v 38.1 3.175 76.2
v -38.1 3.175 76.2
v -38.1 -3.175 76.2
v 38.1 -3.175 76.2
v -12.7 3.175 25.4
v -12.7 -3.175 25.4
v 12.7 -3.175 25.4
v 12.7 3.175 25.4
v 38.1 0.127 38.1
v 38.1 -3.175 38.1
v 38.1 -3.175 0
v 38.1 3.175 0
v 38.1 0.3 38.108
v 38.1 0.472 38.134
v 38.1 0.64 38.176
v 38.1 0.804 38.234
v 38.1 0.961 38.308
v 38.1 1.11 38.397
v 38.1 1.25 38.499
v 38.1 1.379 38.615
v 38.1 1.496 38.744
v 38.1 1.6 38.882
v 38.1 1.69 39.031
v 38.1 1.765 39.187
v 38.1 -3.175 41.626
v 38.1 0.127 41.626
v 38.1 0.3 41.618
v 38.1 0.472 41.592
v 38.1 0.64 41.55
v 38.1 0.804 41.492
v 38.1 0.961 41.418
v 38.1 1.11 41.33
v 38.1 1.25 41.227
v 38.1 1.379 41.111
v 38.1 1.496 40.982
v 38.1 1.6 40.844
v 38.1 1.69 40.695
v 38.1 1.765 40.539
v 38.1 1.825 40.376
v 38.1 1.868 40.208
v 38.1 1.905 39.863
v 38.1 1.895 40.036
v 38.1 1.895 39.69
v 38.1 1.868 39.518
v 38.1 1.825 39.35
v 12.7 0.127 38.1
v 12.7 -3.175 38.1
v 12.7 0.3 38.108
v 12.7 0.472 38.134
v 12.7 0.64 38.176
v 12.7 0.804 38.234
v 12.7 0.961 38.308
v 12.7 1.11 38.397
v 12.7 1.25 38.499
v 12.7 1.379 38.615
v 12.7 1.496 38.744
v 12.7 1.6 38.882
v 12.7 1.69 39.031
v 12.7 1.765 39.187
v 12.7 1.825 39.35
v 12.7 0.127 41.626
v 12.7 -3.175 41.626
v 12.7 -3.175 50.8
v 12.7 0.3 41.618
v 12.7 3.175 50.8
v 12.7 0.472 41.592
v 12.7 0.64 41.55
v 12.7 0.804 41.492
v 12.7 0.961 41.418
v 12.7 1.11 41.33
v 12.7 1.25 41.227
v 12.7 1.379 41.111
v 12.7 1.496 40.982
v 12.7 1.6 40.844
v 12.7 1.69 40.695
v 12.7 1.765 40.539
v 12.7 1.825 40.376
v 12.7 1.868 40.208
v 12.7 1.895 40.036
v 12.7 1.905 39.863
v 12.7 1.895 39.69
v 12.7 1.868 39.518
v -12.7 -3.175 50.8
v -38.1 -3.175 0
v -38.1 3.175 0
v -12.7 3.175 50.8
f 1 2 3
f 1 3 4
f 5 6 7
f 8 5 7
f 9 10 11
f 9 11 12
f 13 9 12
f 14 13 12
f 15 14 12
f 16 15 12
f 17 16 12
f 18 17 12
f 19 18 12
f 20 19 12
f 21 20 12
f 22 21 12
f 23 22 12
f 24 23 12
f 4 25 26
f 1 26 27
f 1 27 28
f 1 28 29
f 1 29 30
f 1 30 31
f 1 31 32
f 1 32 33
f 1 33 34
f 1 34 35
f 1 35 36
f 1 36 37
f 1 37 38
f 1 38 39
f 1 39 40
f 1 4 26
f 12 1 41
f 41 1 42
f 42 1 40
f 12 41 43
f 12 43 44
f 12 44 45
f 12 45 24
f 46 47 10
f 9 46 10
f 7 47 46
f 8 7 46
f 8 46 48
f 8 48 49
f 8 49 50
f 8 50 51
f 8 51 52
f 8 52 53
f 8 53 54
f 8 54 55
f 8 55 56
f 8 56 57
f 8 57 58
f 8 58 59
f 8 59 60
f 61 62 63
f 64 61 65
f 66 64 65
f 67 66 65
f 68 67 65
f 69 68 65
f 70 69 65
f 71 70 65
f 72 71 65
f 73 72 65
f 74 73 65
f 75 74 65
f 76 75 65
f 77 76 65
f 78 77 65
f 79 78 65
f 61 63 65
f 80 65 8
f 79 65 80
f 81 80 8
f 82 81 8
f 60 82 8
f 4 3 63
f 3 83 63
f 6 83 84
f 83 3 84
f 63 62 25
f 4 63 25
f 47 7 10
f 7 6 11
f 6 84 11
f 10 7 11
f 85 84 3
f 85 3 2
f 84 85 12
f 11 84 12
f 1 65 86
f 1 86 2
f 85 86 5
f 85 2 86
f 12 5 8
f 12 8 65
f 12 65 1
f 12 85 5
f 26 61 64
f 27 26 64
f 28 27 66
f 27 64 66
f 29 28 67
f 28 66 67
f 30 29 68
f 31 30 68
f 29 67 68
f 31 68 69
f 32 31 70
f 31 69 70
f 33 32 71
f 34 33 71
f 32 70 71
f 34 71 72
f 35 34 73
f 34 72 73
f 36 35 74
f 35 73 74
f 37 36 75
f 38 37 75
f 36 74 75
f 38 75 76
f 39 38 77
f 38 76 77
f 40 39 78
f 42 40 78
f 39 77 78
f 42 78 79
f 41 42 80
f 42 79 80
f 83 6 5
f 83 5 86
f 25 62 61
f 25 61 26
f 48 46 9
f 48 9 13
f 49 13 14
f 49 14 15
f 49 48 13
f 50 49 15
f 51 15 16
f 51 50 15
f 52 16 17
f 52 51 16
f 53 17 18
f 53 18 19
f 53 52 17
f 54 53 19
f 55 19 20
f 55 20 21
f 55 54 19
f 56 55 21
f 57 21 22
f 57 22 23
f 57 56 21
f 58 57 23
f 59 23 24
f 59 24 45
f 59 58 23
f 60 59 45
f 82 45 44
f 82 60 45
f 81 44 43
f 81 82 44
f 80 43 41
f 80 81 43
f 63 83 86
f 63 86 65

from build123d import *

# Parameters (mm, degrees)
F0_W        = 76.2
F0_H        = 6.35
F1_DEPTH    = 76.2
F2_W        = 25.4
F2_H        = 25.4
F3_DEPTH    = 25.4
F4_W        = 25.4
F4_H        = 3.5260361671
F5_DEPTH    = 5.08
F8_T1_DEPTH = 25.4


# Not quite as in the source:
# - a fillet or chamfer that OpenCascade refuses, or shapes differently, is made with other operations: its cross-section is extruded or revolved along the edge and cut away or added
# - the program builds the solid bodies; features that only make, move or delete a surface that nothing else refers to are left out


with BuildPart() as f1:
    # F0 (on Top) → F1 (new body)
    with BuildSketch(Plane.XY):
        Rectangle(F0_W, F0_H)
    extrude(amount=F1_DEPTH)

    # F2 (on face) → F3 (cut)
    with BuildSketch(Plane.XZ.offset(3.175)):
        with Locations((0, 38.1)):
            Rectangle(F2_W, F2_H)
    extrude(amount=-F3_DEPTH, mode=Mode.SUBTRACT)

    # F4 (on face) → F5 (cut)
    with BuildSketch(Plane.XZ.offset(3.175)):
        with Locations((25.4, 39.8630180836)):
            Rectangle(F4_W, F4_H)
    extrude(amount=-F5_DEPTH, mode=Mode.SUBTRACT)

    # F8: fillet of radius 1.778 on 2 edges, made by hand

    # F8_s2 → F8_t1 (join)
    with BuildSketch(Plane.YZ.offset(12.7)):
        with BuildLine():
            ThreePointArc((0.127, 41.6260361671), (1.3842358569, 41.1052720241), (1.905, 39.8480361671))
            Line((1.905, 39.8480361671), (1.905, 41.6260361671))
            Line((1.905, 41.6260361671), (0.127, 41.6260361671))
        make_face()
        with BuildLine():
            ThreePointArc((0.127, 38.1), (1.3842358569, 38.6207641431), (1.905, 39.878))
            Line((1.905, 39.878), (1.905, 38.1))
            Line((1.905, 38.1), (0.127, 38.1))
        make_face()
    extrude(amount=F8_T1_DEPTH)


solid = f1.part
